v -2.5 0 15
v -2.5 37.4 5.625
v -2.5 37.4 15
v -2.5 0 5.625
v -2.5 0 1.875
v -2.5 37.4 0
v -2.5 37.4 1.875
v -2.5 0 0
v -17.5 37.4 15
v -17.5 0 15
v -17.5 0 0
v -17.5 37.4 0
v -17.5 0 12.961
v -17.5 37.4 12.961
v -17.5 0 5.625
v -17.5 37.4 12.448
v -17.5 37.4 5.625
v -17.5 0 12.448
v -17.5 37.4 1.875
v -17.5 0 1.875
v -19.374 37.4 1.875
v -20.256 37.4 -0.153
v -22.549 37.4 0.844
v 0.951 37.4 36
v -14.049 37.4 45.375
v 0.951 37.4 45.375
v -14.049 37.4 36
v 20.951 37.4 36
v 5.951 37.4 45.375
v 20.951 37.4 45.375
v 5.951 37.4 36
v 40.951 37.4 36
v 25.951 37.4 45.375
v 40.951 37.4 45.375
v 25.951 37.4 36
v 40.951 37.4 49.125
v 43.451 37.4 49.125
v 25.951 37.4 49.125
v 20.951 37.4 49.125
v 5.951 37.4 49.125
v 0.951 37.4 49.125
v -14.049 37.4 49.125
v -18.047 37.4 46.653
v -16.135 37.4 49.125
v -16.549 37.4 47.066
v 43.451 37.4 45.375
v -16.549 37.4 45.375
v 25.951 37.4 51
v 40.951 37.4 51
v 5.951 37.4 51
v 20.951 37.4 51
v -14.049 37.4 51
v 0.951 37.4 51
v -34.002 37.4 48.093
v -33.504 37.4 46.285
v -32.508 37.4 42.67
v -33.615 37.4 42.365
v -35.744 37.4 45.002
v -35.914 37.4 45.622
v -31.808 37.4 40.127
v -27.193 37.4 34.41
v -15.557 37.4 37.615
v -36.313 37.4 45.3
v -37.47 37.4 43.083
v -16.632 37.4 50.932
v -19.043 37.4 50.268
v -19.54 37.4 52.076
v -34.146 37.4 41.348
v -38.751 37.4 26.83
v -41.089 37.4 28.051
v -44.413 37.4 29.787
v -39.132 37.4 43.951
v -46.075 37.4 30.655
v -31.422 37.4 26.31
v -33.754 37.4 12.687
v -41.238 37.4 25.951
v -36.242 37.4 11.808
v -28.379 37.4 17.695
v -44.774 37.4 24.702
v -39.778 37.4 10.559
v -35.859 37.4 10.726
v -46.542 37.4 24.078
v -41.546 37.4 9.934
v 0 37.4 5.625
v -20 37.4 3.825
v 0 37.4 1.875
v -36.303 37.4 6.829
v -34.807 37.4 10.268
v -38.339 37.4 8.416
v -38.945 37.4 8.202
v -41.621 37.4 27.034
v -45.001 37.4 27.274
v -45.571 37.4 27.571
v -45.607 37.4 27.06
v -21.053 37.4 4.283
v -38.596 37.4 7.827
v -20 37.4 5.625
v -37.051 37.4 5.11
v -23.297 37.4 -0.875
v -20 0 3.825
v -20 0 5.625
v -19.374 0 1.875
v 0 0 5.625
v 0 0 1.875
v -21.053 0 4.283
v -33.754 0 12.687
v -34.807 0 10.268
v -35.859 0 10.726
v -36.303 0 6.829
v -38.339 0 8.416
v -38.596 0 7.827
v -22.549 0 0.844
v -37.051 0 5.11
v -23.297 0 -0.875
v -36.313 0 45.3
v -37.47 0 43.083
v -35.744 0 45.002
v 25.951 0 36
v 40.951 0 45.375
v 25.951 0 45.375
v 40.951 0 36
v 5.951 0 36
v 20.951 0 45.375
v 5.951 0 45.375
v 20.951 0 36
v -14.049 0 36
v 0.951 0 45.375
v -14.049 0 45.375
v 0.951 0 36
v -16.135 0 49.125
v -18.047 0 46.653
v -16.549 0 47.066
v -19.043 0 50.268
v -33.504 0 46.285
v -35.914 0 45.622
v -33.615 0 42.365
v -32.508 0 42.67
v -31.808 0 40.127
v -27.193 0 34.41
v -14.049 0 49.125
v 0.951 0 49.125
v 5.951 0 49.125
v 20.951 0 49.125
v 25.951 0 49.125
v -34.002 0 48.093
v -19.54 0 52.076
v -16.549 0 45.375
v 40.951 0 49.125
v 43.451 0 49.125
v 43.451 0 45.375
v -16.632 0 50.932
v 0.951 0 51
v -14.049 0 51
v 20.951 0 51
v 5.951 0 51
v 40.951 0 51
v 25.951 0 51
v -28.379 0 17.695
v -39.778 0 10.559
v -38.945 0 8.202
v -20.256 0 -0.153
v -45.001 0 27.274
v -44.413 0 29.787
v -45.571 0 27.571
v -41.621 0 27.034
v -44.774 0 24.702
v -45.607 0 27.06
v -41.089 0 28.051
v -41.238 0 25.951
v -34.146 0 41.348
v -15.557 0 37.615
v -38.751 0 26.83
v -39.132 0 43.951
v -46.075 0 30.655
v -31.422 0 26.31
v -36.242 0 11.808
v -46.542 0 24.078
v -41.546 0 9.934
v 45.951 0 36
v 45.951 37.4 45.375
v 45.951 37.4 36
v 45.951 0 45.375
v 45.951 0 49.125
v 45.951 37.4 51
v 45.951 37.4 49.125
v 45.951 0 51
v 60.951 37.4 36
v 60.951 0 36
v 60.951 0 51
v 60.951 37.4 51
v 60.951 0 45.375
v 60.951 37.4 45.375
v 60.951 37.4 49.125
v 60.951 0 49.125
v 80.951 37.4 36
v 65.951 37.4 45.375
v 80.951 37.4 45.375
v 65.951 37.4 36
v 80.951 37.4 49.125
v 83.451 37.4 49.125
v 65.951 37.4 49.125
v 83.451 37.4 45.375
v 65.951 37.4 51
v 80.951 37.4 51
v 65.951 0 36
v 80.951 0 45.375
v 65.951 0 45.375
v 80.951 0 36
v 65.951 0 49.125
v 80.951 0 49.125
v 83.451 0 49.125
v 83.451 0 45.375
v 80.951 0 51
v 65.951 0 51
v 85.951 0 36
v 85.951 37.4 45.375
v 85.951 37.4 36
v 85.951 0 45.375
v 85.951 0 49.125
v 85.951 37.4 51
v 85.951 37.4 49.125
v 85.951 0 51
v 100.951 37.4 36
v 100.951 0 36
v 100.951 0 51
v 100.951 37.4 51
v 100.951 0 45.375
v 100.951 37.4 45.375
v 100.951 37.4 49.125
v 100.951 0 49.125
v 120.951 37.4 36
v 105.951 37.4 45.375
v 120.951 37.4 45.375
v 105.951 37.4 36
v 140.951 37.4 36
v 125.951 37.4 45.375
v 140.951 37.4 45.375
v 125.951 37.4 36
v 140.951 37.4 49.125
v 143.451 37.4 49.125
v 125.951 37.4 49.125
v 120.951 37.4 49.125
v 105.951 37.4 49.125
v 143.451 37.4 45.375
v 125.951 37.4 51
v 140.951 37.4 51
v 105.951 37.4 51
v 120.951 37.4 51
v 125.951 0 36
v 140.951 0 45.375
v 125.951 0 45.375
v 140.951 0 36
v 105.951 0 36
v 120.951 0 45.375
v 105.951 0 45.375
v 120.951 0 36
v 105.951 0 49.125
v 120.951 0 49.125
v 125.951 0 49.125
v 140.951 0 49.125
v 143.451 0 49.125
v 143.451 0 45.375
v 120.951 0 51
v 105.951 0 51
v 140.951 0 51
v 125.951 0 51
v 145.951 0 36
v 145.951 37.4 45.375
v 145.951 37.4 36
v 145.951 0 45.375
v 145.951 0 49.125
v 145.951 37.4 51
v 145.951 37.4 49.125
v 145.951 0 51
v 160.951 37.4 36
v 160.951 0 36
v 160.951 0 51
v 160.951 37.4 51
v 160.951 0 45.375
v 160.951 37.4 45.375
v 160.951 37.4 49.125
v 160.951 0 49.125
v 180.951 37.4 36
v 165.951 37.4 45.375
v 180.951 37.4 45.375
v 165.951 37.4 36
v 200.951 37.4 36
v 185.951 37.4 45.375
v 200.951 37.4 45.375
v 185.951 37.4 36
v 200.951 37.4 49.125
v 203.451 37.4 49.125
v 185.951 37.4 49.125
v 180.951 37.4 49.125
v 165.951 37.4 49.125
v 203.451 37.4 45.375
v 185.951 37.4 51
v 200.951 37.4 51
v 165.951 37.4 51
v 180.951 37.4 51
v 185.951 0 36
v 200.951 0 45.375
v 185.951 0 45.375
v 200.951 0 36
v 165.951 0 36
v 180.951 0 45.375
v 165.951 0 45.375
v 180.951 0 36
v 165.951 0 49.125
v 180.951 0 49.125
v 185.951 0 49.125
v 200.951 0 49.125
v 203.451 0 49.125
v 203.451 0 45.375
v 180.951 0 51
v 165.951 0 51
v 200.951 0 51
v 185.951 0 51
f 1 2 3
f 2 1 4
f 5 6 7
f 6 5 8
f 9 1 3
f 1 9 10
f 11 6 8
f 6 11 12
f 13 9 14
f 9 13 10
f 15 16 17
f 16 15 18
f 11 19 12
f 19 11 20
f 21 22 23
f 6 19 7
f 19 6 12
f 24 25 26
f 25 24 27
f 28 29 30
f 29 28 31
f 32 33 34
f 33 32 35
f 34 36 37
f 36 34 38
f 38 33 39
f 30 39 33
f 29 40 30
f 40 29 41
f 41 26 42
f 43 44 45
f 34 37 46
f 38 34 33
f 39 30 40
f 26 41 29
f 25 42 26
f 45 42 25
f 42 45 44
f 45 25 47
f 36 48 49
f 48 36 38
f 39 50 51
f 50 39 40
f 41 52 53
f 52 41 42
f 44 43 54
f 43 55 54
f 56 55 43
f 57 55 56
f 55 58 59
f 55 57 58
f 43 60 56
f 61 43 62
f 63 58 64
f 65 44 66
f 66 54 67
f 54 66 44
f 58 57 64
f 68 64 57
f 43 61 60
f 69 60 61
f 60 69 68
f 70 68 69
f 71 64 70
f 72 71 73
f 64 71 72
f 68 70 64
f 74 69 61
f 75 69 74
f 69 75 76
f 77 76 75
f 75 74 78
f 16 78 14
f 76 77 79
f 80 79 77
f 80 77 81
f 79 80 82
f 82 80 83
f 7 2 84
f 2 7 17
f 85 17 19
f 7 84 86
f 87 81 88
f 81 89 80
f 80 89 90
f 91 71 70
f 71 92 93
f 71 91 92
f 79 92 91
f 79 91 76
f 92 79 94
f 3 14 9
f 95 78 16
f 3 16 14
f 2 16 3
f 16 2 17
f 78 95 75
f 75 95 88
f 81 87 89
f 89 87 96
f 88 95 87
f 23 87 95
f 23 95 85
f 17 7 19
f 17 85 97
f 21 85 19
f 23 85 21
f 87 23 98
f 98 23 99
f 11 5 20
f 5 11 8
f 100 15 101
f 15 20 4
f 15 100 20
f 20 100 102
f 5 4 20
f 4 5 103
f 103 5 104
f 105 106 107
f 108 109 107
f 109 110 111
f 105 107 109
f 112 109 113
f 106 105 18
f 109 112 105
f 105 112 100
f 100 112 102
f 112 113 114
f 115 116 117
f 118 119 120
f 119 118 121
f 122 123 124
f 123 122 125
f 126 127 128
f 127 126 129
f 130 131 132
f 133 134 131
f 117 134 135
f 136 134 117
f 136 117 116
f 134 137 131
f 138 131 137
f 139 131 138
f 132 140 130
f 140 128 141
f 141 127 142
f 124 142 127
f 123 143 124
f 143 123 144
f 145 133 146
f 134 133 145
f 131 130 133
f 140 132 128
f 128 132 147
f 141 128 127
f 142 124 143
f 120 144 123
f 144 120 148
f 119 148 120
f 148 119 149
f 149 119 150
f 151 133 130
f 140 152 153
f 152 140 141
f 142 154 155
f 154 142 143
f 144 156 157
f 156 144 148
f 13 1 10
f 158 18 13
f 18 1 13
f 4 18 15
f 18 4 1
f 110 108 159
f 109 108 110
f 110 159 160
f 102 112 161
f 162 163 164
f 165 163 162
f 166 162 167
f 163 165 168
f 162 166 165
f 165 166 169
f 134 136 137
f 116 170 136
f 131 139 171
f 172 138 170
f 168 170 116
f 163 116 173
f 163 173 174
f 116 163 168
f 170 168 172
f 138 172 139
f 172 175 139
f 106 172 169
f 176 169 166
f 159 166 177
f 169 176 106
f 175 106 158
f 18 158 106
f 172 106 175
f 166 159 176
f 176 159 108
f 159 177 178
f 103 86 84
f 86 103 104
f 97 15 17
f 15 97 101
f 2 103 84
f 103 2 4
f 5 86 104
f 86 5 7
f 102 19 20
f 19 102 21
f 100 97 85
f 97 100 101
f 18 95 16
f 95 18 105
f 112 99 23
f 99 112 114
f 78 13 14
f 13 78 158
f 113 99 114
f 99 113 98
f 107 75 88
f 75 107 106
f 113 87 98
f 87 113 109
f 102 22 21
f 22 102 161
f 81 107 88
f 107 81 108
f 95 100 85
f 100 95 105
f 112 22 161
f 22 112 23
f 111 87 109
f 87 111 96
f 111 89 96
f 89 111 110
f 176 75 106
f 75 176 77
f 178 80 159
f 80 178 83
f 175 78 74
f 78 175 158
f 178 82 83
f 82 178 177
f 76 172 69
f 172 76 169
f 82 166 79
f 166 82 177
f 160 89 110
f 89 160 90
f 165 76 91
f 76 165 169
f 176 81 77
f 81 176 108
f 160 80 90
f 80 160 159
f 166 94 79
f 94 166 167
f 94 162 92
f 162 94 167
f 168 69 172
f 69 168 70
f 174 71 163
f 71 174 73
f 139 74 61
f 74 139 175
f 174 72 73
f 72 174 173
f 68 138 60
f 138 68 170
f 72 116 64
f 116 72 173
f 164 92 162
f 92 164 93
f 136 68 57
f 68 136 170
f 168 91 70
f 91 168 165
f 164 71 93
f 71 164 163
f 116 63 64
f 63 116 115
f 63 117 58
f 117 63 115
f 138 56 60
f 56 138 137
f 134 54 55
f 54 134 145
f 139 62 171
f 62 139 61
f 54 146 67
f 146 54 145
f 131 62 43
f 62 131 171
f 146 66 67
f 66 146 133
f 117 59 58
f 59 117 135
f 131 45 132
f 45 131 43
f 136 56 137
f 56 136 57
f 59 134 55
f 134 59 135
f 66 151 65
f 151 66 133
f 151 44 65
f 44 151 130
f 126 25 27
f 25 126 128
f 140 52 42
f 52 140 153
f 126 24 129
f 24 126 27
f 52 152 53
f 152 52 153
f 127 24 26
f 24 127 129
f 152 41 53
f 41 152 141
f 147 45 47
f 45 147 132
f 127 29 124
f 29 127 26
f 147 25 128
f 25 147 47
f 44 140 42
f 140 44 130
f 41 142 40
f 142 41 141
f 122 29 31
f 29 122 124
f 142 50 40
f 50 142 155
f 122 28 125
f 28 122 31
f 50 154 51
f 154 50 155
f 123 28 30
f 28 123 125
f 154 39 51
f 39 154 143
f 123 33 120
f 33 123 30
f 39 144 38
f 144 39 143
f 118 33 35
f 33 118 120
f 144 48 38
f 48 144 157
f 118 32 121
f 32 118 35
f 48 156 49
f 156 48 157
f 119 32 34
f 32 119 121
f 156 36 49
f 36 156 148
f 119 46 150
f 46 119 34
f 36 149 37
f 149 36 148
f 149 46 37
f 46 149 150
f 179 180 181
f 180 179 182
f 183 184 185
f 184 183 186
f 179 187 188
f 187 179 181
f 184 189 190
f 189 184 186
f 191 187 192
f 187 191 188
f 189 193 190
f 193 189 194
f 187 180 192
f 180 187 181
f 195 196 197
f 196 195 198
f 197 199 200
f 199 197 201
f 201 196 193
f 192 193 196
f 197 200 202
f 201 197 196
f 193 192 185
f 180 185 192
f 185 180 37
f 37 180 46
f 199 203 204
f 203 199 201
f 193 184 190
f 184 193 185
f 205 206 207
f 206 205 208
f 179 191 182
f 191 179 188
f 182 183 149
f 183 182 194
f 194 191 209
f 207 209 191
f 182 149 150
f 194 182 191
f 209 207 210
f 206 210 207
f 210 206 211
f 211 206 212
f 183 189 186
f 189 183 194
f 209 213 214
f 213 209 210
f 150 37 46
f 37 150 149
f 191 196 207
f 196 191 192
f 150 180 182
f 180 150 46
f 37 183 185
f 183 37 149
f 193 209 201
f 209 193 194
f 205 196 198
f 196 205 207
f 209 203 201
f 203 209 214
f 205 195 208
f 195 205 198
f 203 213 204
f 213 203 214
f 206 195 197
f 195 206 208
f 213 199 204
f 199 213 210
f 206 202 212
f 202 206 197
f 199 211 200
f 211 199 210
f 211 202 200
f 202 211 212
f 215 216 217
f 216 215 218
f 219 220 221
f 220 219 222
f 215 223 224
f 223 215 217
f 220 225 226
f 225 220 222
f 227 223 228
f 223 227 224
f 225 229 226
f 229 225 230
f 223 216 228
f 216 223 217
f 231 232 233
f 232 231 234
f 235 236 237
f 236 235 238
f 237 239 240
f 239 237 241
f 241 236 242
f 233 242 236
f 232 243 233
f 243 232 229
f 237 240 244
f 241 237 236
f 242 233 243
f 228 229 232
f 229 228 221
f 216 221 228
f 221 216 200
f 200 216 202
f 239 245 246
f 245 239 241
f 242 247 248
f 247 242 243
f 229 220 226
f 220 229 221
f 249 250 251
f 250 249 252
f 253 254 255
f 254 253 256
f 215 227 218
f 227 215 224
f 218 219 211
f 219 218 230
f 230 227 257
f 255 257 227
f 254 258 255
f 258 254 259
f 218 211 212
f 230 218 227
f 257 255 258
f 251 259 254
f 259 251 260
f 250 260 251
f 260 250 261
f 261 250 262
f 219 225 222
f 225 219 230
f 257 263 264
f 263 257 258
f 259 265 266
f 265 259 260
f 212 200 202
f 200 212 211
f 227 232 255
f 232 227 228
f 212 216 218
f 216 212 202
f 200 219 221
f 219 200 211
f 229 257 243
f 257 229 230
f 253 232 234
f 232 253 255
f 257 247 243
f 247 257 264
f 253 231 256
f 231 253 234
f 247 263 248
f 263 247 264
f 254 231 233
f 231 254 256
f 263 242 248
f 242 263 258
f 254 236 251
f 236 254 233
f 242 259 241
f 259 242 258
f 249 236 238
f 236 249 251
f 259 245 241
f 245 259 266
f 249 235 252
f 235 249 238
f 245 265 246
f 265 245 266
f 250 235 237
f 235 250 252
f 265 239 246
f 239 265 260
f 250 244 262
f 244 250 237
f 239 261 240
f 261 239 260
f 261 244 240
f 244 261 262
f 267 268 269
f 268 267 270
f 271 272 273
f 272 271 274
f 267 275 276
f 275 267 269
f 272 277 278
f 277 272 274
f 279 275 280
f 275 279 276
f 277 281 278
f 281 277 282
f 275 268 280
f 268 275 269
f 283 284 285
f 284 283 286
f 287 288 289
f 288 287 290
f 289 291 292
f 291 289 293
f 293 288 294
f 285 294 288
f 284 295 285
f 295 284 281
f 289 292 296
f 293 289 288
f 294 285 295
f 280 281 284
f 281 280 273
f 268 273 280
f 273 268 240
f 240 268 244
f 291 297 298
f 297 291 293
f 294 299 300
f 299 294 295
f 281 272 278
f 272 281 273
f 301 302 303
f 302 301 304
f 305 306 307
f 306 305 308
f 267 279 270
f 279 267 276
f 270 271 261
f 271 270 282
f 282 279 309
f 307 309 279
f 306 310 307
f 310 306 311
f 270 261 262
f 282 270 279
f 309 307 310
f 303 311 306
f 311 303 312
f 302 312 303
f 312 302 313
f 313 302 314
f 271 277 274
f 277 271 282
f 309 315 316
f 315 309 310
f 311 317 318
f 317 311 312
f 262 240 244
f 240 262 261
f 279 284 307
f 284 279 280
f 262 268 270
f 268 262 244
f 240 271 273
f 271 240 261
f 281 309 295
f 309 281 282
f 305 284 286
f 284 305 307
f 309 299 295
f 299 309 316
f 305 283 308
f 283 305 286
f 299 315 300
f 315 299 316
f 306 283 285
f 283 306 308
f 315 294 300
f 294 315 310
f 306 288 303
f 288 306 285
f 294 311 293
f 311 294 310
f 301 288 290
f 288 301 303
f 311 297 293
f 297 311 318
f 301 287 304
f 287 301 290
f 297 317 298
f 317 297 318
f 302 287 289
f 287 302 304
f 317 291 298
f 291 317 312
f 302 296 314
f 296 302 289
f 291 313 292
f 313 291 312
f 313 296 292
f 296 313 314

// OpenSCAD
PI=3.141592653589793;

module e_lement(elwidth,elheight,ellength){
translate([2.5,0,0])cube([ellength-5,elwidth,elheight]);
translate([0,0,elheight/8])cube([ellength,elwidth,elheight/4]);
}

module echain(elwidth,elheight,ellength,radius,numelems,pos){
	L=ellength*(numelems-2);
	travel=2*(L-radius*PI);
	echo(str(numelems,"pcs echain W",elwidth," H",elheight," pitch ", ellength," R",radius, " travel range:",travel,"mm"));
	H=radius*2+elheight;
	clamppos=max(0,min(pos,travel));
	els_in_curve=(radius*PI/ellength);
	angular_pitch=180/(els_in_curve+1);
	extrangle=(-2*ellength-clamppos)*angular_pitch/ellength/2;
	for(i=[1:numelems]){
		translate([-clamppos/2-1*ellength,0,0]){
			if(i*angular_pitch+extrangle<=180 && i*angular_pitch+extrangle>=0)
				translate([ellength/2,0,radius+elheight/2])
					rotate([0,i*angular_pitch+extrangle,0])
						translate([-ellength/2,0,-radius-elheight/2])
							e_lement(elwidth,elheight,ellength);
			if(i*angular_pitch+extrangle>180)
				translate(
				[ellength/2-(180-extrangle-i*angular_pitch)*ellength/(angular_pitch),
				0,radius+elheight/2])
					rotate([0,180,0])
						translate([-ellength/2,0,-radius-elheight/2])
							e_lement(elwidth,elheight,ellength);
			if(i*angular_pitch+extrangle<0)
				translate(
				[ellength/2+(-extrangle-i*angular_pitch)*ellength/(angular_pitch),
				0,radius+elheight/2])
					translate([-ellength/2,0,-radius-elheight/2])
						e_lement(elwidth,elheight,ellength);
		}
	}

}

echain(37.4,15,20,18,16,20);
